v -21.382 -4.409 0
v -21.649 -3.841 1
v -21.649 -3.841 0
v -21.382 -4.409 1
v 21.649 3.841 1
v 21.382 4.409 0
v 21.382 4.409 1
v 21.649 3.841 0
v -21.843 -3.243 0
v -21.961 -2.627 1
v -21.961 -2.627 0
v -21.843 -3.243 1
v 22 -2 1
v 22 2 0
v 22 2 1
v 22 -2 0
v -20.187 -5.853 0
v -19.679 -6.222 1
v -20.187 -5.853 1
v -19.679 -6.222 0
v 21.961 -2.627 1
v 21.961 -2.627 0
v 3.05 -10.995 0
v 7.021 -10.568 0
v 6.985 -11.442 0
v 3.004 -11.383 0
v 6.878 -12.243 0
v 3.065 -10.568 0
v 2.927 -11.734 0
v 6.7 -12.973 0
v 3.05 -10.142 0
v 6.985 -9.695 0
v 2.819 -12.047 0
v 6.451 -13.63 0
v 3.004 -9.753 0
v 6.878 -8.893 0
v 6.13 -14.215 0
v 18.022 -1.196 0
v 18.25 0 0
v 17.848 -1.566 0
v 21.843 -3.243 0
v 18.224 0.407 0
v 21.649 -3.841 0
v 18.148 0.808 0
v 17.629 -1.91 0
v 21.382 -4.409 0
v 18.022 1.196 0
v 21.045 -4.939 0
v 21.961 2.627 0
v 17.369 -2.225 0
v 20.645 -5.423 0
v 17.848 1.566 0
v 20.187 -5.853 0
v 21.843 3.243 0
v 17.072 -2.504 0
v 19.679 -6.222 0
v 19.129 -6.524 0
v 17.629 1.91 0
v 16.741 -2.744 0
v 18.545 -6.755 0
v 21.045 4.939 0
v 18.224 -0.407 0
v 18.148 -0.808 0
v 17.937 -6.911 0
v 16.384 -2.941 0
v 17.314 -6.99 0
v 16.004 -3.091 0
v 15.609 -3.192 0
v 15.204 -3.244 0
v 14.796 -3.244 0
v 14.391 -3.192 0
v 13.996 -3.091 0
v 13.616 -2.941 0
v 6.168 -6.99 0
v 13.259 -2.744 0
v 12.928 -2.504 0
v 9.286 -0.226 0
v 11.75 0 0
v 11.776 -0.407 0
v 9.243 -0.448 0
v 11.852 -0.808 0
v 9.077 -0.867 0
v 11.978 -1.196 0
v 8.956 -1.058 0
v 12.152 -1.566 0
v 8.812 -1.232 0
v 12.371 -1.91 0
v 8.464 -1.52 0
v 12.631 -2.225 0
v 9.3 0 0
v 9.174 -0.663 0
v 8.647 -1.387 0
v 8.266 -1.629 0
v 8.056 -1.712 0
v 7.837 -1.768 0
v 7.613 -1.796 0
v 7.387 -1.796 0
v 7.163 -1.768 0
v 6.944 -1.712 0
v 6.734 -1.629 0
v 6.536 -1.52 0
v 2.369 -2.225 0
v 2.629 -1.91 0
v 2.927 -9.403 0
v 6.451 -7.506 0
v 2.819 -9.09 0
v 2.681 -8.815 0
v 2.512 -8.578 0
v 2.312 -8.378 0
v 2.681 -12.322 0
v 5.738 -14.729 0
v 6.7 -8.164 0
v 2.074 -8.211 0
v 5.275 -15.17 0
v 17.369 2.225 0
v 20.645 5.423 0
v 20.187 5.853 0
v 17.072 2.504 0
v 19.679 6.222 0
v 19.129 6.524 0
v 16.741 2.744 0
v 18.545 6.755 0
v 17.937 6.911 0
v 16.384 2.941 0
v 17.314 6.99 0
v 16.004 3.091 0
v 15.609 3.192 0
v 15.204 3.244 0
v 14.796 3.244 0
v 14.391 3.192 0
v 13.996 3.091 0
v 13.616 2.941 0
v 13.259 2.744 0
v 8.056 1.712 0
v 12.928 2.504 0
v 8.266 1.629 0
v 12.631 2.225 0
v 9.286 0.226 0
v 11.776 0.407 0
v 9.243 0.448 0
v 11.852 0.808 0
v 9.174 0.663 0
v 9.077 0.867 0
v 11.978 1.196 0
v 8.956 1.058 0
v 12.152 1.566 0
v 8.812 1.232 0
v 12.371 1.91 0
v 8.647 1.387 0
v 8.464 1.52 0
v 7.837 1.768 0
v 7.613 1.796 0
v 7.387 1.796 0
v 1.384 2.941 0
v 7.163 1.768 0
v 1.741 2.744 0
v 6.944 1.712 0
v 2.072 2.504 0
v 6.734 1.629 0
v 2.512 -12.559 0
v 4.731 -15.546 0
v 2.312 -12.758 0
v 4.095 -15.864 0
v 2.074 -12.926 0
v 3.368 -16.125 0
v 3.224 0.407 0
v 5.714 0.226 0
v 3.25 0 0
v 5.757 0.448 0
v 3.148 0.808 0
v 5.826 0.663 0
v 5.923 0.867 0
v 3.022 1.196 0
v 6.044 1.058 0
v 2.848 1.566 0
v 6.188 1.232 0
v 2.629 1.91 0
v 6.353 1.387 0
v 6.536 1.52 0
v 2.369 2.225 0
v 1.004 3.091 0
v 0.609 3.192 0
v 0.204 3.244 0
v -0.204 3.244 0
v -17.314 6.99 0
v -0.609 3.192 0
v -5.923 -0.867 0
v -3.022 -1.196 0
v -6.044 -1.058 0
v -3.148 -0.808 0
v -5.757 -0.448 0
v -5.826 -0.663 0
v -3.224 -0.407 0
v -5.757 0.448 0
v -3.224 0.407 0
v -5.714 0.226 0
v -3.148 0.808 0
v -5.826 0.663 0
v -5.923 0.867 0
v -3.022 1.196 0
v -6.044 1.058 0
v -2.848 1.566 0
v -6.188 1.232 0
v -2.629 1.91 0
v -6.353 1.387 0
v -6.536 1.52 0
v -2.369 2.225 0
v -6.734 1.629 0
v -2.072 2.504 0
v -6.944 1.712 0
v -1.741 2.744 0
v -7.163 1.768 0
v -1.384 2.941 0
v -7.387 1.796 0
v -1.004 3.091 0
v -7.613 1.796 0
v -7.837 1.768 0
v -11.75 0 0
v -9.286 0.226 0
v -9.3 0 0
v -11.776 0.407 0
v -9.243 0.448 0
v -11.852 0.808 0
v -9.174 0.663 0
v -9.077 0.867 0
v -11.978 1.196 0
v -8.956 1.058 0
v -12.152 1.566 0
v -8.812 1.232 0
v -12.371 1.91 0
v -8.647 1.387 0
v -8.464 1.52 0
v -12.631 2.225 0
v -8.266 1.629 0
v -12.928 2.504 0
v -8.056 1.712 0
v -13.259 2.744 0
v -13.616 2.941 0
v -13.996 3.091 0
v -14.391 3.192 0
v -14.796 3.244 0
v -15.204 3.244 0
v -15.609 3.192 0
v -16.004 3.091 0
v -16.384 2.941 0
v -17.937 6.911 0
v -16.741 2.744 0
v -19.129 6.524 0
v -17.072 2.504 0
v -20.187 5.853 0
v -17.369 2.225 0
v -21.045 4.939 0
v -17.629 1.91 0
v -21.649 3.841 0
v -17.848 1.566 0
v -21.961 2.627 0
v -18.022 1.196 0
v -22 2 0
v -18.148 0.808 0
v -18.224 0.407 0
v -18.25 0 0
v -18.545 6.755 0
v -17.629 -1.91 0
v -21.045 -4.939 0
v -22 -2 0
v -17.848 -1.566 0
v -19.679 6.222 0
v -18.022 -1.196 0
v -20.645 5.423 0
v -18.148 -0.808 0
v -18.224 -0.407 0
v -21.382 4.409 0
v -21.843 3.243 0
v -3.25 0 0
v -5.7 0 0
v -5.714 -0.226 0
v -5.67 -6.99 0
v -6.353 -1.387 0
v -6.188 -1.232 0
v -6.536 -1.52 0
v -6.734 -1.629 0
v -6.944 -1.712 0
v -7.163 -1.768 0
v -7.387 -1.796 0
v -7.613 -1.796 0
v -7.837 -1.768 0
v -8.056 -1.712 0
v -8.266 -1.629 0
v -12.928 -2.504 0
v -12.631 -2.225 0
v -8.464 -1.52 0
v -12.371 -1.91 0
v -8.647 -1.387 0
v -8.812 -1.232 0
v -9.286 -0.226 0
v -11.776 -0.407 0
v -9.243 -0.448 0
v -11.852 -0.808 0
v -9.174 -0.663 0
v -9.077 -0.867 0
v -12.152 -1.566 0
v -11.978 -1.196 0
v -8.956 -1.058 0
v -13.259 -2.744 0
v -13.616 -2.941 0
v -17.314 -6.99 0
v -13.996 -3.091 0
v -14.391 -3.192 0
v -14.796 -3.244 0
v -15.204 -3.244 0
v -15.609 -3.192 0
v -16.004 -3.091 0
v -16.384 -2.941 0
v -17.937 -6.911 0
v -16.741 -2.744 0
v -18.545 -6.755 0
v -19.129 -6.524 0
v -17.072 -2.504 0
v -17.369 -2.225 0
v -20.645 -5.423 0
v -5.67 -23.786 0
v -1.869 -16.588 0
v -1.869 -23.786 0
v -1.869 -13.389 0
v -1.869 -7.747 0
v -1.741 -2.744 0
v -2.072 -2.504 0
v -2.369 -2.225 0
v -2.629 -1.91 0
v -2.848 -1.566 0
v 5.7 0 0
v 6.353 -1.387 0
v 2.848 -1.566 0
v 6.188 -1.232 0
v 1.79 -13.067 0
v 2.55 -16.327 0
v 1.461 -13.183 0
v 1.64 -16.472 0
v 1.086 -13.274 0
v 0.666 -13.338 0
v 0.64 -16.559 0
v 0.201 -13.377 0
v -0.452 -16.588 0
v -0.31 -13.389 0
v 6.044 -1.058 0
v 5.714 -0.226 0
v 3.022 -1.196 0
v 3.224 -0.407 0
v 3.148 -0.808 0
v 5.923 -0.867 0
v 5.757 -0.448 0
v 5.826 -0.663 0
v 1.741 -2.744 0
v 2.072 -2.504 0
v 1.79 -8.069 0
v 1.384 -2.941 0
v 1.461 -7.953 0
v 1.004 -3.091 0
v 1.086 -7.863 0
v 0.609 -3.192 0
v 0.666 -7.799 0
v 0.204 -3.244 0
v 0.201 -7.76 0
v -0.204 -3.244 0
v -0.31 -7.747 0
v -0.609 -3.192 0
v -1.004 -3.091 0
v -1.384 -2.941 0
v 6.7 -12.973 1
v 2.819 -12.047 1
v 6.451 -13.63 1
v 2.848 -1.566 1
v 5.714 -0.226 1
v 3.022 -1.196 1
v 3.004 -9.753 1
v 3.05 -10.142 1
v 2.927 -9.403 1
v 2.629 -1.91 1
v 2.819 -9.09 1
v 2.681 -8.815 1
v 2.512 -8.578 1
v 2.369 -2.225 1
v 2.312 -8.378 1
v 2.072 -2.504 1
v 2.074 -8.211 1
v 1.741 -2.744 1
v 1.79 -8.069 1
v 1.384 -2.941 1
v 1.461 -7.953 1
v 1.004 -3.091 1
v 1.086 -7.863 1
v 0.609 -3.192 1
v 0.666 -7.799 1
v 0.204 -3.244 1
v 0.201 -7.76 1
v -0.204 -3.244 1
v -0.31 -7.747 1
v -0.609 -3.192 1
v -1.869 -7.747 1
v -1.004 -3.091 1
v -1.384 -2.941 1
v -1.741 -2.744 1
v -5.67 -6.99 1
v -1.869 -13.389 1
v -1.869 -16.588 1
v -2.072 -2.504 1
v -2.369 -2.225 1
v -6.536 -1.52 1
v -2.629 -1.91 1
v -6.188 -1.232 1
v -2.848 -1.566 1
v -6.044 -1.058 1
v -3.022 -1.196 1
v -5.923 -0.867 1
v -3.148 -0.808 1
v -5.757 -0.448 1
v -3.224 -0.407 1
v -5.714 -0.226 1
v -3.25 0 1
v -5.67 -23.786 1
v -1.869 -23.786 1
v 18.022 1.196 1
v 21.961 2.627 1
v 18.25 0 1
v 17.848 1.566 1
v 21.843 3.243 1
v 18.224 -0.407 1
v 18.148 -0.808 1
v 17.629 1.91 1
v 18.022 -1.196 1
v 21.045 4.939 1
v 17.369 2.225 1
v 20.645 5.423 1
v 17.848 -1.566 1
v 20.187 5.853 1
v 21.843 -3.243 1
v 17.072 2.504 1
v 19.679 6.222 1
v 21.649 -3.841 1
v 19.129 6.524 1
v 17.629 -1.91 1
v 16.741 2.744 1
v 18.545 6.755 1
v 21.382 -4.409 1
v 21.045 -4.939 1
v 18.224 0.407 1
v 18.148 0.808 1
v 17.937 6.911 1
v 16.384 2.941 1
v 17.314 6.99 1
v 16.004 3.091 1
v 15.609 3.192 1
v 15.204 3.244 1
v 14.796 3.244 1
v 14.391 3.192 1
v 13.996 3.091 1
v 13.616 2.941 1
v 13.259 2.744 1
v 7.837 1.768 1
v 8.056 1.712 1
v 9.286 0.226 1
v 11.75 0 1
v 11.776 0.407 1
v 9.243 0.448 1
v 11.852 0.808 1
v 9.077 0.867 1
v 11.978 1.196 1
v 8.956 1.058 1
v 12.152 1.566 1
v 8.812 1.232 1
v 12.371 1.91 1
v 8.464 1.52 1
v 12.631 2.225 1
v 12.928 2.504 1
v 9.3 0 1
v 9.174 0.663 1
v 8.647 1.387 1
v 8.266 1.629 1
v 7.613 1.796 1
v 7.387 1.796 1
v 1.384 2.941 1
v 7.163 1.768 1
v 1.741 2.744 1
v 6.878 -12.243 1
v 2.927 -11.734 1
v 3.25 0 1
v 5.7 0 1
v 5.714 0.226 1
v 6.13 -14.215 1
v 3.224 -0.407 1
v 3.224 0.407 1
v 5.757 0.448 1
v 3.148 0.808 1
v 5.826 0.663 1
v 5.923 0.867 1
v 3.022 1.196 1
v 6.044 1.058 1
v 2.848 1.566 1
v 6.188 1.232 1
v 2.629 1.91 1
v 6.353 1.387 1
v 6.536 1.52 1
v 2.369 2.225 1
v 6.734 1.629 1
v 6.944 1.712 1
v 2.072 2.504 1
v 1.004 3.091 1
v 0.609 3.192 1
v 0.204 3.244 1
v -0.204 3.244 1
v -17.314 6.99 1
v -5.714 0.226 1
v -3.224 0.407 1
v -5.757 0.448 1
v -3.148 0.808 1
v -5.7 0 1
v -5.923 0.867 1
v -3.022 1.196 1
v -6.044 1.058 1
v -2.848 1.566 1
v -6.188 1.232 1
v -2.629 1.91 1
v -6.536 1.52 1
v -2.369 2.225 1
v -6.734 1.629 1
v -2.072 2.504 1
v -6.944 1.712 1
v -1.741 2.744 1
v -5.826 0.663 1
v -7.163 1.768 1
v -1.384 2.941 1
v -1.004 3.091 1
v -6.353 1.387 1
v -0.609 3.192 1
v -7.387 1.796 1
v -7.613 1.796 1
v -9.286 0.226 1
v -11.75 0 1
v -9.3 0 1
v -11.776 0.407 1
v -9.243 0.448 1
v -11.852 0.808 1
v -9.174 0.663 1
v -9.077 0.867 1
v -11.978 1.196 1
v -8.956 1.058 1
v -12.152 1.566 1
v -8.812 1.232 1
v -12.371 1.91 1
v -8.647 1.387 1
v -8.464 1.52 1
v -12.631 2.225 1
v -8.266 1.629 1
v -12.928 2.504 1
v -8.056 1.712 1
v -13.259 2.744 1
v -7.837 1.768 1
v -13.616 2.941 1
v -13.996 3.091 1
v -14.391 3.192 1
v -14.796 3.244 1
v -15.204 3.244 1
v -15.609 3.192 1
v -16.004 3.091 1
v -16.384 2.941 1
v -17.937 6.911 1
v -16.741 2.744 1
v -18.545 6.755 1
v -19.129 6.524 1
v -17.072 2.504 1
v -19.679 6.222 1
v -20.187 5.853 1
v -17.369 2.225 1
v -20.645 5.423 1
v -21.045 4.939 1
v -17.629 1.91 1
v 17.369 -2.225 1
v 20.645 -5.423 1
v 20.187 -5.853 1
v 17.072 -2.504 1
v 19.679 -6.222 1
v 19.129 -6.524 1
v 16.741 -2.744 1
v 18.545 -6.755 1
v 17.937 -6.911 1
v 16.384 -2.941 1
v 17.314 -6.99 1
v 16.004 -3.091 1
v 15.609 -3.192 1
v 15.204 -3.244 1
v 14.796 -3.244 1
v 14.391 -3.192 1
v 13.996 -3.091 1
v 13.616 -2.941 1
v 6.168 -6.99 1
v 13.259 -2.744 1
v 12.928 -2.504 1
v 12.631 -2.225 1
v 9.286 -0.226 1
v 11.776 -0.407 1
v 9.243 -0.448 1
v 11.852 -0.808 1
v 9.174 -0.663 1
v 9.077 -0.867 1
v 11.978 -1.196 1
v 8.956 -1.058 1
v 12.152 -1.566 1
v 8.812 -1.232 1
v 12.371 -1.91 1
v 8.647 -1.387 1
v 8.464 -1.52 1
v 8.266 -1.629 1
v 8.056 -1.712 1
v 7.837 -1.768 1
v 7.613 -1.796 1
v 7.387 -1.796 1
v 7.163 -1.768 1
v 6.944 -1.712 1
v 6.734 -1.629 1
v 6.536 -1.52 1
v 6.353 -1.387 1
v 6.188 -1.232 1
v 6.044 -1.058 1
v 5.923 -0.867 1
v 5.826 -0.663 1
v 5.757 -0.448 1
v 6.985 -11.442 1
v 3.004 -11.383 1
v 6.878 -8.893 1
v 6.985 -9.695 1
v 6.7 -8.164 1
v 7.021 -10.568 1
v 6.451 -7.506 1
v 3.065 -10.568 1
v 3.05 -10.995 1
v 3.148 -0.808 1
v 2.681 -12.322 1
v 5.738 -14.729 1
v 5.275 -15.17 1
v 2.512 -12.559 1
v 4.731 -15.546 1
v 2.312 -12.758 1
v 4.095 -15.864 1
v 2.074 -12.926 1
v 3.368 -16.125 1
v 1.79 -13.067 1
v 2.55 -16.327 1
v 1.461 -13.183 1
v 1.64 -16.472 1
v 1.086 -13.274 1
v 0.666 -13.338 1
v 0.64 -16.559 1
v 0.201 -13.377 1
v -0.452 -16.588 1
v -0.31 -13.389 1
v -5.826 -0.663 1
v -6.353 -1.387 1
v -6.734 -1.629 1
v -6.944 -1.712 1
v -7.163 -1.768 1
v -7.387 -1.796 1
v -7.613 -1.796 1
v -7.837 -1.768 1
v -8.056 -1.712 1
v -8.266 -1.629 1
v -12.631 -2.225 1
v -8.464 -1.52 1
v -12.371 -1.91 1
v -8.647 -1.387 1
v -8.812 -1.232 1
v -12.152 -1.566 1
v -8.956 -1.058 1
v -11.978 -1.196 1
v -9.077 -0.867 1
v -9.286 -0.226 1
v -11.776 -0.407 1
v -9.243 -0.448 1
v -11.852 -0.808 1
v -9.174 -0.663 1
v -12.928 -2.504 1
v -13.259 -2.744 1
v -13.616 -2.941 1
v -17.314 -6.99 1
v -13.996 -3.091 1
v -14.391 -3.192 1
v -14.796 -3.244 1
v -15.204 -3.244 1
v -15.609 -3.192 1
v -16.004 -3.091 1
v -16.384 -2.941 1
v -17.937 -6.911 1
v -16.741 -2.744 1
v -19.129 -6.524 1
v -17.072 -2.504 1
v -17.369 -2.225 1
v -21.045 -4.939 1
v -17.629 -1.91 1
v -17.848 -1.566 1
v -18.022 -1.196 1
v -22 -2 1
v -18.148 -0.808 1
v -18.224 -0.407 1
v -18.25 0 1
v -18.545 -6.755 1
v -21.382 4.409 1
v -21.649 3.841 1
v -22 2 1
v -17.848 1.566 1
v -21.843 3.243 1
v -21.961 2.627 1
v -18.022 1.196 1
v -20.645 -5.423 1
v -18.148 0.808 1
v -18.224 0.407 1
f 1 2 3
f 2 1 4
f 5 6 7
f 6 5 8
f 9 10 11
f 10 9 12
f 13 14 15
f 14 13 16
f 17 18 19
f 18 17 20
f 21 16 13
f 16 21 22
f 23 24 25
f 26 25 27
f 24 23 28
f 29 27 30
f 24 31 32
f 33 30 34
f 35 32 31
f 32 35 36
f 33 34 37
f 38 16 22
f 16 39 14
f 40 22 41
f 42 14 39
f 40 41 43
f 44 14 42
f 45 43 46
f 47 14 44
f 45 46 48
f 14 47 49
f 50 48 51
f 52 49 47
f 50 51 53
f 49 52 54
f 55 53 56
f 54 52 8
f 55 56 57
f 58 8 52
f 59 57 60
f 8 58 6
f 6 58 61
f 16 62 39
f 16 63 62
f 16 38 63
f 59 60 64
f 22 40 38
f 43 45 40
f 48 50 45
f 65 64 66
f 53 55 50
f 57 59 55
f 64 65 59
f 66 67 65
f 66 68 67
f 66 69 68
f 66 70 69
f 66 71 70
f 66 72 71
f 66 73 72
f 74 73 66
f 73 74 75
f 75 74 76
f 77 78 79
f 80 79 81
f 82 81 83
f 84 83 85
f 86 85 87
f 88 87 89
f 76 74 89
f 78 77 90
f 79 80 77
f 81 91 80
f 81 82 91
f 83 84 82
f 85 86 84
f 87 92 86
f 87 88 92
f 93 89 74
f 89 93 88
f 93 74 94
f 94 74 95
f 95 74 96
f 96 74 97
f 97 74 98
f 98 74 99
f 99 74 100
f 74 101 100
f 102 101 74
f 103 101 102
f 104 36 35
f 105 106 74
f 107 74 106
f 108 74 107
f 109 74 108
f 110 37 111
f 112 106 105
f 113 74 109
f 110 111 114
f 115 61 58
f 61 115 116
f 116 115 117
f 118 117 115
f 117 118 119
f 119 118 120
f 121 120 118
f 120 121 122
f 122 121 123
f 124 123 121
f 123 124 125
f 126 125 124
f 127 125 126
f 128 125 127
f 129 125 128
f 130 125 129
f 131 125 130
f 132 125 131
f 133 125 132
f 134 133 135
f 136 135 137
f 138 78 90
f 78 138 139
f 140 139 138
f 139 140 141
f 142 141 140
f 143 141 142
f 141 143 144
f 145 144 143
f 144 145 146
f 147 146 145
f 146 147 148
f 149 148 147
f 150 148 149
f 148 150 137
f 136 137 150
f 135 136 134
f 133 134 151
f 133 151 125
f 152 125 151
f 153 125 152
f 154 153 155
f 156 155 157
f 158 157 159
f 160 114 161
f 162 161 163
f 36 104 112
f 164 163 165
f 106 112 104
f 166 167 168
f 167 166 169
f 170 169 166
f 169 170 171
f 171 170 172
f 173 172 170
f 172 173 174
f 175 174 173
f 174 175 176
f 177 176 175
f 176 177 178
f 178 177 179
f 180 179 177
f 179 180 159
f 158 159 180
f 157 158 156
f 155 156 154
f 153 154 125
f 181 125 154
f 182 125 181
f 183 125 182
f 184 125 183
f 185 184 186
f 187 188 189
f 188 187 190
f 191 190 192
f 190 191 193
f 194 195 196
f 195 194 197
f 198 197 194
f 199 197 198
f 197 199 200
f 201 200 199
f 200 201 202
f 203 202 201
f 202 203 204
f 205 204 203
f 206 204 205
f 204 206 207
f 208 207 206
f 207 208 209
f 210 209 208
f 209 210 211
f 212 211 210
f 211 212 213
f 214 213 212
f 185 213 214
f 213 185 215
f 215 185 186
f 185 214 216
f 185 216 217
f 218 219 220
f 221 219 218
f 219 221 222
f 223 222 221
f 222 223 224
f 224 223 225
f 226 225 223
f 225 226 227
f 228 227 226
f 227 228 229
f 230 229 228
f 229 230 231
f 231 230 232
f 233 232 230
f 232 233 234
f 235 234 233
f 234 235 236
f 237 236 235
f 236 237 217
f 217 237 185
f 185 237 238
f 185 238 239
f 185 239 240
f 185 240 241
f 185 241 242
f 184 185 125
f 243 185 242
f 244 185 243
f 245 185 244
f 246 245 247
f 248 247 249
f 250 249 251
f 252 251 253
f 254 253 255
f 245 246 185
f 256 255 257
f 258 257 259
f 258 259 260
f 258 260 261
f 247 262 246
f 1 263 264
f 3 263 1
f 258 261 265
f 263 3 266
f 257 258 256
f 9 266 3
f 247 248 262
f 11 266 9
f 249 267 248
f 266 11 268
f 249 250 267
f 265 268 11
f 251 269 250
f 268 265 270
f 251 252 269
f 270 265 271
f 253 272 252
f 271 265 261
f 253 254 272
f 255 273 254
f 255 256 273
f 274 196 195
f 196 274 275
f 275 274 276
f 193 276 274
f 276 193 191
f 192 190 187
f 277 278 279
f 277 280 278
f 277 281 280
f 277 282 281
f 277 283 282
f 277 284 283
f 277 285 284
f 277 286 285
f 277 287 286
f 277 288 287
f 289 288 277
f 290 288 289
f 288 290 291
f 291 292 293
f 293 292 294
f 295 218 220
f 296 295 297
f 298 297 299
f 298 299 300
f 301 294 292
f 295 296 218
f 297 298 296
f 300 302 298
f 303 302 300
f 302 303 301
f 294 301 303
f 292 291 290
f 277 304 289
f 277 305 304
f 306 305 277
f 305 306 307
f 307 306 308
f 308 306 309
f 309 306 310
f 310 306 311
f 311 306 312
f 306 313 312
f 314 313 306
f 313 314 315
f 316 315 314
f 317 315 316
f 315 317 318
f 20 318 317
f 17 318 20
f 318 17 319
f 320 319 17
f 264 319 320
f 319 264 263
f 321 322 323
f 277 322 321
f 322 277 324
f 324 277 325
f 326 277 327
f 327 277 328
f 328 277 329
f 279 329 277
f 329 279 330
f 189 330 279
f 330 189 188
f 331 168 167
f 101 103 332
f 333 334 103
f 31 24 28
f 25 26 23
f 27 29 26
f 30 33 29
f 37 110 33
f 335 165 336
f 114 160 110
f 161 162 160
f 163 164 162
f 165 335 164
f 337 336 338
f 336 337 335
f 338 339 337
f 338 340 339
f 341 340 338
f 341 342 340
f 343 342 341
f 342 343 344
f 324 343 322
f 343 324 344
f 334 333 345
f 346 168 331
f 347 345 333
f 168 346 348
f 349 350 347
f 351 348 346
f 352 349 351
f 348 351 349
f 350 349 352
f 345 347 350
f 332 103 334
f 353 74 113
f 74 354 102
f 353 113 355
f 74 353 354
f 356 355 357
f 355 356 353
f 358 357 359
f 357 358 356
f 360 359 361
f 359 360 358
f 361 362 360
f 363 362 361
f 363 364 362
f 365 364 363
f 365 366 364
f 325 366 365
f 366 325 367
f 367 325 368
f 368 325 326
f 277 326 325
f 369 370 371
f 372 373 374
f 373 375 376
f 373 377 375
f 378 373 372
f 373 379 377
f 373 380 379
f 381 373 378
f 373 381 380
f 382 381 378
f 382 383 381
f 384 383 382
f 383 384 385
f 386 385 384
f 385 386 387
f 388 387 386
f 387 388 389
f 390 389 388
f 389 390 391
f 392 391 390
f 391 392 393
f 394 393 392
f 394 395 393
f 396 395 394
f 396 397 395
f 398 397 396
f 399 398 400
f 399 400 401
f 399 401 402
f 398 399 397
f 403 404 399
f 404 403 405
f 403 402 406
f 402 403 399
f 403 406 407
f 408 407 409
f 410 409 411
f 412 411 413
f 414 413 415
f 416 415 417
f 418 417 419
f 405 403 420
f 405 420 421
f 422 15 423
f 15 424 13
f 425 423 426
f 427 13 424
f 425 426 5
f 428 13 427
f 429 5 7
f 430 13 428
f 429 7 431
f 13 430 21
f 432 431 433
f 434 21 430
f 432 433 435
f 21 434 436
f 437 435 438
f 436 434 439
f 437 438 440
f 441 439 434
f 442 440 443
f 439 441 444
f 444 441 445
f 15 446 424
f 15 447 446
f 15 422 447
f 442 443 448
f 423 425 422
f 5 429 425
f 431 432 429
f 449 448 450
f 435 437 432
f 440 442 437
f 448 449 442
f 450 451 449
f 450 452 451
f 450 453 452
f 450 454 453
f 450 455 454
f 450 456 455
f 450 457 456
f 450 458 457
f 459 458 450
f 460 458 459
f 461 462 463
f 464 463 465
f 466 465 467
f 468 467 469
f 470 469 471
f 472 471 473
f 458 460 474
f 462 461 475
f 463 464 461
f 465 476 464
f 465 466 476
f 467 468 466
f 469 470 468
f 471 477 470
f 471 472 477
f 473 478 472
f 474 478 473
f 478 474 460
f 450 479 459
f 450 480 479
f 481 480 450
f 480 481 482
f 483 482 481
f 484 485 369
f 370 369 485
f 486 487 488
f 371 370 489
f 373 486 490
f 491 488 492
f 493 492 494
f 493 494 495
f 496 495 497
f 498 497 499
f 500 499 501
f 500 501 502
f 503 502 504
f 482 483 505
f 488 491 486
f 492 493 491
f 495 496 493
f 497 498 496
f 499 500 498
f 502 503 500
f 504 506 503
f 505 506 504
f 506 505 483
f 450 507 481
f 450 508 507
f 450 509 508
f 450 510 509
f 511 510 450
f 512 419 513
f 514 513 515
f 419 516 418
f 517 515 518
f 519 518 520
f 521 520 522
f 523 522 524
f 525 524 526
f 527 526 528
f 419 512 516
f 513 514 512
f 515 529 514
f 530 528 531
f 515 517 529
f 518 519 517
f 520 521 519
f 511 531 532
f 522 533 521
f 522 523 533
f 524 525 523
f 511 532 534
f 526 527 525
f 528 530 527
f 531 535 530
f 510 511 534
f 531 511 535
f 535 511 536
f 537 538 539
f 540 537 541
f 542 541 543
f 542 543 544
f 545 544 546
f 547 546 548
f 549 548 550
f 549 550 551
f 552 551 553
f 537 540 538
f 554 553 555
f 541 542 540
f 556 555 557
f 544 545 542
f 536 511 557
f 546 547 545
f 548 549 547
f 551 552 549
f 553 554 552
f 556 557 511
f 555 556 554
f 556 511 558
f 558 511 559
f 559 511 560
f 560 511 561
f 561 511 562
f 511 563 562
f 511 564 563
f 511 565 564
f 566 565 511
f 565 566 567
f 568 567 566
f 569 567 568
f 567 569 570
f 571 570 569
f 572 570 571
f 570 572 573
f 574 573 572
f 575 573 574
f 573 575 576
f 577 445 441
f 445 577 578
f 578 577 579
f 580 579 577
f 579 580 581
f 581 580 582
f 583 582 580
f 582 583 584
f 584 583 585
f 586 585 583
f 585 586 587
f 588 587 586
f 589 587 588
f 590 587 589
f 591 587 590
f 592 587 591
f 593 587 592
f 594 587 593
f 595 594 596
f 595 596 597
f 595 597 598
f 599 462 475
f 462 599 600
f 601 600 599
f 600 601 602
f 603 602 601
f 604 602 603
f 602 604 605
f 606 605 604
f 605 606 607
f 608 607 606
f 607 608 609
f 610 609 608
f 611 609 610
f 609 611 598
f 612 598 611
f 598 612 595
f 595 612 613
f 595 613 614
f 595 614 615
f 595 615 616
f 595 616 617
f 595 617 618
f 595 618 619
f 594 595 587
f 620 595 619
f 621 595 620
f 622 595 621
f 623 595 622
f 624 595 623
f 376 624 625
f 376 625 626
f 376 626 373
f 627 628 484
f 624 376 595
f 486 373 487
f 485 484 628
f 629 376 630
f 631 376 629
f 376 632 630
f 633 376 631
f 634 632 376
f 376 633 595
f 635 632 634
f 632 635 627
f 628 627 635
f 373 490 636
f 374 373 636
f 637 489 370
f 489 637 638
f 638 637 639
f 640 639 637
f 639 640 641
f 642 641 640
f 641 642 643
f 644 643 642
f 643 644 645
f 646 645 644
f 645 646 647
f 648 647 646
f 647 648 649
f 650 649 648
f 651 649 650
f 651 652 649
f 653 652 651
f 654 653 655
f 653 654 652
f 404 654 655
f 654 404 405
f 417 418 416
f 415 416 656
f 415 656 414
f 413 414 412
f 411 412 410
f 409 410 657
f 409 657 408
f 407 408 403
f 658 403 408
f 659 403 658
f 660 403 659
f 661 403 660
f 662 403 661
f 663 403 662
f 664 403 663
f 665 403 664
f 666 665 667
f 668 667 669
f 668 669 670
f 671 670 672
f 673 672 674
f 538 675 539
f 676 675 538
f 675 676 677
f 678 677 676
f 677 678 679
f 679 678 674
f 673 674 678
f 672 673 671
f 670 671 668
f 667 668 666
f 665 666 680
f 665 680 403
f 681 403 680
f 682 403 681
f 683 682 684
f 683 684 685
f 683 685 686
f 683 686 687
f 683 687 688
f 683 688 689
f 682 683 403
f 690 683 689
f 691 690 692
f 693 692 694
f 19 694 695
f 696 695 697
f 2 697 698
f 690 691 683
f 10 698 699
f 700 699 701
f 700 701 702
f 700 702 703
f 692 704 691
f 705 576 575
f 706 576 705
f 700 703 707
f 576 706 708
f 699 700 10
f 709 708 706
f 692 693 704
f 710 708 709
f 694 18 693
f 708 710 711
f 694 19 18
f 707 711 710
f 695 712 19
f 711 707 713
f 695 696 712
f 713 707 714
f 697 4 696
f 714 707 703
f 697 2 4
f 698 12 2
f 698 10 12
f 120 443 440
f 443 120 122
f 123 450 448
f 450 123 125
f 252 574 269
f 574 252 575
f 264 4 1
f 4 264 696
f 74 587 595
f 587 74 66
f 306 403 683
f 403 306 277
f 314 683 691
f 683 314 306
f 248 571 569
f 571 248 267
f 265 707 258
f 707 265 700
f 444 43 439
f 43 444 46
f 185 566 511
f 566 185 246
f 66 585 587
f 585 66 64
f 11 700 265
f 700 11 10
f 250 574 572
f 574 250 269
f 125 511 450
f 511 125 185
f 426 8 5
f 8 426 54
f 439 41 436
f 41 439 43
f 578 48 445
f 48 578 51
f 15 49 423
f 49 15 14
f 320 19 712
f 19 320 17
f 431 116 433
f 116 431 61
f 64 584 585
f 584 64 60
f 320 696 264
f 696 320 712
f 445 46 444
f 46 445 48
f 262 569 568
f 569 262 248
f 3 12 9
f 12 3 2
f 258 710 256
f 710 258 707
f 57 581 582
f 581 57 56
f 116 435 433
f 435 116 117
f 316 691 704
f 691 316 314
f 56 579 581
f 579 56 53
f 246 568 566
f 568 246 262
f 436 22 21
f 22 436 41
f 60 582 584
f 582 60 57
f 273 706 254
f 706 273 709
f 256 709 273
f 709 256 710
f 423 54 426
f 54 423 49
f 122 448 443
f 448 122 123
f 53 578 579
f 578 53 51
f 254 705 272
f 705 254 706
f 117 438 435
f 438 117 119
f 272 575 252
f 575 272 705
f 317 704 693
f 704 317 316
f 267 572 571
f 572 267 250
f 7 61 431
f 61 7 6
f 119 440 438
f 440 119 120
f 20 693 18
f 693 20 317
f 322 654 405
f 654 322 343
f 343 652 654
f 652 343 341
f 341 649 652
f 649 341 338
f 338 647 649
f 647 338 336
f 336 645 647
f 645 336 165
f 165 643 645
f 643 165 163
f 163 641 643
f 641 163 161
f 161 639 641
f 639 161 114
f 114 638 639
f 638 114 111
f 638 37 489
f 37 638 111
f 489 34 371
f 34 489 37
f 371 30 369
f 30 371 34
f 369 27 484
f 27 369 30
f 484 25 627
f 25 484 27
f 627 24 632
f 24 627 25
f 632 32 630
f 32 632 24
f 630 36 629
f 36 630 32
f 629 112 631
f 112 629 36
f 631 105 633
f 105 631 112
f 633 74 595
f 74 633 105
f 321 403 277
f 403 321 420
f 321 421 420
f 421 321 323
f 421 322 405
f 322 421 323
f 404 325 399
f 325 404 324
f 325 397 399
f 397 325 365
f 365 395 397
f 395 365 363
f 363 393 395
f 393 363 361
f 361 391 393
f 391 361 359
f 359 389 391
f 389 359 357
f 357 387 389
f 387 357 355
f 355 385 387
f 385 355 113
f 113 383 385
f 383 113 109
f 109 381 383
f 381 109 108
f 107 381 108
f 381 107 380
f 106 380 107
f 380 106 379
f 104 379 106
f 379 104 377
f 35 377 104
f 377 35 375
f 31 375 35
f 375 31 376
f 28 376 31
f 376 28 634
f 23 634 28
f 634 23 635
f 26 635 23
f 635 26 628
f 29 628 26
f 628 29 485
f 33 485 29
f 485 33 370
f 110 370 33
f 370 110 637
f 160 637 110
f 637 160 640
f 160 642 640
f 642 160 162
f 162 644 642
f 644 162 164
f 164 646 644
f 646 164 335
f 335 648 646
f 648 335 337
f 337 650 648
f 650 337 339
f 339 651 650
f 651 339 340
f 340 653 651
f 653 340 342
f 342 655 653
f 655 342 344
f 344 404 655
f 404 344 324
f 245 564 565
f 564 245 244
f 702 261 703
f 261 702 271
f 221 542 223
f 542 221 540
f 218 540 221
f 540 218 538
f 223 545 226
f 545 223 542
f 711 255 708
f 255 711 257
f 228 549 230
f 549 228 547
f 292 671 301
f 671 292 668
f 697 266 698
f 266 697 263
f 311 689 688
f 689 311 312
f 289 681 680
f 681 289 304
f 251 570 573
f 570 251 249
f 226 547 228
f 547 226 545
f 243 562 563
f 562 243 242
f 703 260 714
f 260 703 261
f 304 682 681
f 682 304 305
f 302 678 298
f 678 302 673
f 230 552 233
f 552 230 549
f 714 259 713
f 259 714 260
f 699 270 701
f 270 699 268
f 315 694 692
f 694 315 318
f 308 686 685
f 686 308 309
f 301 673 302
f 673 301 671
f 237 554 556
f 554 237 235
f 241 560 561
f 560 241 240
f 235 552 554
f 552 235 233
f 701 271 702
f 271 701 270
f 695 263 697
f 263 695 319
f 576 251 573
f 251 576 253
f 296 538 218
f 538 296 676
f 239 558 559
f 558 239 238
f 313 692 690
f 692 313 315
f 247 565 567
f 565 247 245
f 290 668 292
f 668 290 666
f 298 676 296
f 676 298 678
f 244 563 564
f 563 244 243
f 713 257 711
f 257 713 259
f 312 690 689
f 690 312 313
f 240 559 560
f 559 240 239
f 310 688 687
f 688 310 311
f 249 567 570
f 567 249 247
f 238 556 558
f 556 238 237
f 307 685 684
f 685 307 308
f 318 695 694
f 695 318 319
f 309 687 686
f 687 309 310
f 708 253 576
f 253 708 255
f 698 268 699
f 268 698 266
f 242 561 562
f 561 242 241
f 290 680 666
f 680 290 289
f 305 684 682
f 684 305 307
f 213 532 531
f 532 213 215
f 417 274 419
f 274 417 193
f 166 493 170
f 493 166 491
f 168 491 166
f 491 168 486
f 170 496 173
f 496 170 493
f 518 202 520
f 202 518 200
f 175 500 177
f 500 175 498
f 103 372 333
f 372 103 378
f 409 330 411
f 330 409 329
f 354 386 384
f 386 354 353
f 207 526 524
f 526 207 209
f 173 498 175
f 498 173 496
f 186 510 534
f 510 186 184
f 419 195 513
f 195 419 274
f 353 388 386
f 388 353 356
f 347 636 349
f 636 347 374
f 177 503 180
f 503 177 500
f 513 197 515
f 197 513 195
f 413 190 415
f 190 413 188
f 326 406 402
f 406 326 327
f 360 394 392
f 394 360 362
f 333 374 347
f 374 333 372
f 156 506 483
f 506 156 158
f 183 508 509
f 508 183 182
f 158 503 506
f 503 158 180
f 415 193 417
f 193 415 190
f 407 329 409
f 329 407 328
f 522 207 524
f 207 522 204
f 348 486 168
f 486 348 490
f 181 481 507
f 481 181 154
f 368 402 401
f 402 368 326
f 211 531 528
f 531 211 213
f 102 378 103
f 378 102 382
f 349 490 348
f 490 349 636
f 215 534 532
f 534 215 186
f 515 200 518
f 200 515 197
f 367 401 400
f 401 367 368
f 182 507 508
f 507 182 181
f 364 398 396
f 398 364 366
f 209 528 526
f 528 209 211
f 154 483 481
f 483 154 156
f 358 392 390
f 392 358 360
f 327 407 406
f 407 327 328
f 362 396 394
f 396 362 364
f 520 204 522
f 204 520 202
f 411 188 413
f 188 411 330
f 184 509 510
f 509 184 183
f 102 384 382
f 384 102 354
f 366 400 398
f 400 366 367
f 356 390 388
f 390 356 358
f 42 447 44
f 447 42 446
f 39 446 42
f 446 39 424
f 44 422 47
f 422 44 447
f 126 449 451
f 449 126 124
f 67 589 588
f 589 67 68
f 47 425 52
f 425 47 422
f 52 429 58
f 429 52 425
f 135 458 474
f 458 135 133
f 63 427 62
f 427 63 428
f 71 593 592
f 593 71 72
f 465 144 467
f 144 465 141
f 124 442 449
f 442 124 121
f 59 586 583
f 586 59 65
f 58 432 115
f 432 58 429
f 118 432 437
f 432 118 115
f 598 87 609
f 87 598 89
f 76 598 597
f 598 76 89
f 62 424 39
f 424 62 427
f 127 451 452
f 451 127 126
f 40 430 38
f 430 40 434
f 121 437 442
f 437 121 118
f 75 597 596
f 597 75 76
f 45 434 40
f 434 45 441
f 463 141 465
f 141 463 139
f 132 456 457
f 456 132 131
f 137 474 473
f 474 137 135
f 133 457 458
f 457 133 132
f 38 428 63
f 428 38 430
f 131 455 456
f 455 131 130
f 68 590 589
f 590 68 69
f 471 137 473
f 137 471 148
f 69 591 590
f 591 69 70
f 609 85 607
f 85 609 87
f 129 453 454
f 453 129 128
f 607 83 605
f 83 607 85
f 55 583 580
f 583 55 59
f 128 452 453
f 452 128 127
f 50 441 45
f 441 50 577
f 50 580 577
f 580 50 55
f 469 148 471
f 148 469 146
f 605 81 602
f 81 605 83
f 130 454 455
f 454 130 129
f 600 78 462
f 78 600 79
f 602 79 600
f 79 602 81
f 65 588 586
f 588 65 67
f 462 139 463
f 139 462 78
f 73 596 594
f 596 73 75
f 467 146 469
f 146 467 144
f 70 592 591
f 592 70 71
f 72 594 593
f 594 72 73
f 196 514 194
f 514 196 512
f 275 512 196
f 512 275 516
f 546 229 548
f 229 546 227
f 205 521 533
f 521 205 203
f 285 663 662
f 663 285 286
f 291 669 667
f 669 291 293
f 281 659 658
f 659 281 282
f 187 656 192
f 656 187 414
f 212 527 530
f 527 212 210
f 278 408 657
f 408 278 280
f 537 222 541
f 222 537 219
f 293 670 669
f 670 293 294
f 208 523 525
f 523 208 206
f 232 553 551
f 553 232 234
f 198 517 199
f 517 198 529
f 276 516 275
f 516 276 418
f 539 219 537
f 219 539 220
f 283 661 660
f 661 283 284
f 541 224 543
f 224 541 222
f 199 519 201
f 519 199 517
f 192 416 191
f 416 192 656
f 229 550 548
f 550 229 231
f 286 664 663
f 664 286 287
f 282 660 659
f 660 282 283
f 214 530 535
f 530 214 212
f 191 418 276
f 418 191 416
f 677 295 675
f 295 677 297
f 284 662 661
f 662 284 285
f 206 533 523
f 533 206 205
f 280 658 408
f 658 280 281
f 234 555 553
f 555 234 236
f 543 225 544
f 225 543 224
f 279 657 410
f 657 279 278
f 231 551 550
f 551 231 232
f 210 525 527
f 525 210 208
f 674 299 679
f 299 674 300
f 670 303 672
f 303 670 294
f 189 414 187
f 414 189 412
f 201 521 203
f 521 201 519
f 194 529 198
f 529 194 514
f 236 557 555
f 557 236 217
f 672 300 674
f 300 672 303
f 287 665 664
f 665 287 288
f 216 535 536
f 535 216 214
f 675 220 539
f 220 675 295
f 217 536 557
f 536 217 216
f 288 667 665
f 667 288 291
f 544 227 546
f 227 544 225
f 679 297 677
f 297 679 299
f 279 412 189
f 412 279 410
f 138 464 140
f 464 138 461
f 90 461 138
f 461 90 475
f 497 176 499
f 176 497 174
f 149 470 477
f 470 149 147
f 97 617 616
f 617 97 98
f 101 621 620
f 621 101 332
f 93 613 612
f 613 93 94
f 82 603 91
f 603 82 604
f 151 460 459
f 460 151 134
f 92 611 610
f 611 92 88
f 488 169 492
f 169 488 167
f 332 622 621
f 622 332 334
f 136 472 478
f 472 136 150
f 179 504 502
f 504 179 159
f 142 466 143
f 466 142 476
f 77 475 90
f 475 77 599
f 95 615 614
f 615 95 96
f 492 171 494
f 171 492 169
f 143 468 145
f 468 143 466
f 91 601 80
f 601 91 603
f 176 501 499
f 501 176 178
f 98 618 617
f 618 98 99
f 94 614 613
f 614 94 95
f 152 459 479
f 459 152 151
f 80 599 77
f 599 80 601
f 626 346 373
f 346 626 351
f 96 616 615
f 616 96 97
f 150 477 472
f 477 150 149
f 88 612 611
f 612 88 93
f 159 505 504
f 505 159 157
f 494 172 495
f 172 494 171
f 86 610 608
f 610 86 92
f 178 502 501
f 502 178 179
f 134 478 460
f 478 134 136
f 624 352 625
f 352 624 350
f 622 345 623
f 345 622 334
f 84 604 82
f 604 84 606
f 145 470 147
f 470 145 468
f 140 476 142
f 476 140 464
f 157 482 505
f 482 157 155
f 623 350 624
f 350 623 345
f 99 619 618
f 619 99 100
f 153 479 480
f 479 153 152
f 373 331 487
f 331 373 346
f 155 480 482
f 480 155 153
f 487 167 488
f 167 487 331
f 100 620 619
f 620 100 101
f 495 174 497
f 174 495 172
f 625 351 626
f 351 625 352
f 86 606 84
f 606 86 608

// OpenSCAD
$fn = 50;


difference() {
	union() {
		*color(alpha = 1.0000000000, c = "gray") {
			translate(v = [0, 14, 0]) {
				linear_extrude(height = 1) {
					text(font = "Arial:style=Bold", halign = "center", size = 4.5000000000, text = "COMMENT description oobb_plate_shape_p_type_1_depth_3_width_1_thickness_p_extra_oobb_size", valign = "center");
				}
			}
		}
		hull() {
			translate(v = [-17.0000000000, 2.0000000000, 0]) {
				cylinder(h = 1, r = 5);
			}
			translate(v = [17.0000000000, 2.0000000000, 0]) {
				cylinder(h = 1, r = 5);
			}
			translate(v = [-17.0000000000, -2.0000000000, 0]) {
				cylinder(h = 1, r = 5);
			}
			translate(v = [17.0000000000, -2.0000000000, 0]) {
				cylinder(h = 1, r = 5);
			}
		}
		translate(v = [0, -5, 0]) {
			linear_extrude(height = 1) {
				text(font = "DejaVu Sans Mono:style=Bold", halign = "center", size = 19.0000000000, text = "P", valign = "top");
			}
		}
	}
	union() {
		*color(alpha = 1.0000000000, c = "gray") {
			translate(v = [0, 14, 0]) {
				linear_extrude(height = 1) {
					text(font = "Arial:style=Bold", halign = "center", size = 4.5000000000, text = "COMMENT description oobb_holes_shape_n_type_3_width_1_thickness_p_extra_oobb_size_1_height_'all'_holes_true_both_holes", valign = "center");
				}
			}
		}
		translate(v = [-15.0000000000, 0.0000000000, 0]) {
			translate(v = [0, 0, -50]) {
				cylinder(h = 100, r = 3.2500000000);
			}
		}
		translate(v = [0, 0, -50]) {
			cylinder(h = 100, r = 3.2500000000);
		}
		translate(v = [15.0000000000, 0.0000000000, 0]) {
			translate(v = [0, 0, -50]) {
				cylinder(h = 100, r = 3.2500000000);
			}
		}
		translate(v = [-15.0000000000, 0.0000000000, 0]) {
			translate(v = [0, 0, -50]) {
				cylinder(h = 100, r = 1.8000000000);
			}
		}
		translate(v = [-7.5000000000, 0.0000000000, 0]) {
			translate(v = [0, 0, -50]) {
				cylinder(h = 100, r = 1.8000000000);
			}
		}
		translate(v = [0, 0, -50]) {
			cylinder(h = 100, r = 1.8000000000);
		}
		translate(v = [7.5000000000, 0.0000000000, 0]) {
			translate(v = [0, 0, -50]) {
				cylinder(h = 100, r = 1.8000000000);
			}
		}
		translate(v = [15.0000000000, 0.0000000000, 0]) {
			translate(v = [0, 0, -50]) {
				cylinder(h = 100, r = 1.8000000000);
			}
		}
	}
}
